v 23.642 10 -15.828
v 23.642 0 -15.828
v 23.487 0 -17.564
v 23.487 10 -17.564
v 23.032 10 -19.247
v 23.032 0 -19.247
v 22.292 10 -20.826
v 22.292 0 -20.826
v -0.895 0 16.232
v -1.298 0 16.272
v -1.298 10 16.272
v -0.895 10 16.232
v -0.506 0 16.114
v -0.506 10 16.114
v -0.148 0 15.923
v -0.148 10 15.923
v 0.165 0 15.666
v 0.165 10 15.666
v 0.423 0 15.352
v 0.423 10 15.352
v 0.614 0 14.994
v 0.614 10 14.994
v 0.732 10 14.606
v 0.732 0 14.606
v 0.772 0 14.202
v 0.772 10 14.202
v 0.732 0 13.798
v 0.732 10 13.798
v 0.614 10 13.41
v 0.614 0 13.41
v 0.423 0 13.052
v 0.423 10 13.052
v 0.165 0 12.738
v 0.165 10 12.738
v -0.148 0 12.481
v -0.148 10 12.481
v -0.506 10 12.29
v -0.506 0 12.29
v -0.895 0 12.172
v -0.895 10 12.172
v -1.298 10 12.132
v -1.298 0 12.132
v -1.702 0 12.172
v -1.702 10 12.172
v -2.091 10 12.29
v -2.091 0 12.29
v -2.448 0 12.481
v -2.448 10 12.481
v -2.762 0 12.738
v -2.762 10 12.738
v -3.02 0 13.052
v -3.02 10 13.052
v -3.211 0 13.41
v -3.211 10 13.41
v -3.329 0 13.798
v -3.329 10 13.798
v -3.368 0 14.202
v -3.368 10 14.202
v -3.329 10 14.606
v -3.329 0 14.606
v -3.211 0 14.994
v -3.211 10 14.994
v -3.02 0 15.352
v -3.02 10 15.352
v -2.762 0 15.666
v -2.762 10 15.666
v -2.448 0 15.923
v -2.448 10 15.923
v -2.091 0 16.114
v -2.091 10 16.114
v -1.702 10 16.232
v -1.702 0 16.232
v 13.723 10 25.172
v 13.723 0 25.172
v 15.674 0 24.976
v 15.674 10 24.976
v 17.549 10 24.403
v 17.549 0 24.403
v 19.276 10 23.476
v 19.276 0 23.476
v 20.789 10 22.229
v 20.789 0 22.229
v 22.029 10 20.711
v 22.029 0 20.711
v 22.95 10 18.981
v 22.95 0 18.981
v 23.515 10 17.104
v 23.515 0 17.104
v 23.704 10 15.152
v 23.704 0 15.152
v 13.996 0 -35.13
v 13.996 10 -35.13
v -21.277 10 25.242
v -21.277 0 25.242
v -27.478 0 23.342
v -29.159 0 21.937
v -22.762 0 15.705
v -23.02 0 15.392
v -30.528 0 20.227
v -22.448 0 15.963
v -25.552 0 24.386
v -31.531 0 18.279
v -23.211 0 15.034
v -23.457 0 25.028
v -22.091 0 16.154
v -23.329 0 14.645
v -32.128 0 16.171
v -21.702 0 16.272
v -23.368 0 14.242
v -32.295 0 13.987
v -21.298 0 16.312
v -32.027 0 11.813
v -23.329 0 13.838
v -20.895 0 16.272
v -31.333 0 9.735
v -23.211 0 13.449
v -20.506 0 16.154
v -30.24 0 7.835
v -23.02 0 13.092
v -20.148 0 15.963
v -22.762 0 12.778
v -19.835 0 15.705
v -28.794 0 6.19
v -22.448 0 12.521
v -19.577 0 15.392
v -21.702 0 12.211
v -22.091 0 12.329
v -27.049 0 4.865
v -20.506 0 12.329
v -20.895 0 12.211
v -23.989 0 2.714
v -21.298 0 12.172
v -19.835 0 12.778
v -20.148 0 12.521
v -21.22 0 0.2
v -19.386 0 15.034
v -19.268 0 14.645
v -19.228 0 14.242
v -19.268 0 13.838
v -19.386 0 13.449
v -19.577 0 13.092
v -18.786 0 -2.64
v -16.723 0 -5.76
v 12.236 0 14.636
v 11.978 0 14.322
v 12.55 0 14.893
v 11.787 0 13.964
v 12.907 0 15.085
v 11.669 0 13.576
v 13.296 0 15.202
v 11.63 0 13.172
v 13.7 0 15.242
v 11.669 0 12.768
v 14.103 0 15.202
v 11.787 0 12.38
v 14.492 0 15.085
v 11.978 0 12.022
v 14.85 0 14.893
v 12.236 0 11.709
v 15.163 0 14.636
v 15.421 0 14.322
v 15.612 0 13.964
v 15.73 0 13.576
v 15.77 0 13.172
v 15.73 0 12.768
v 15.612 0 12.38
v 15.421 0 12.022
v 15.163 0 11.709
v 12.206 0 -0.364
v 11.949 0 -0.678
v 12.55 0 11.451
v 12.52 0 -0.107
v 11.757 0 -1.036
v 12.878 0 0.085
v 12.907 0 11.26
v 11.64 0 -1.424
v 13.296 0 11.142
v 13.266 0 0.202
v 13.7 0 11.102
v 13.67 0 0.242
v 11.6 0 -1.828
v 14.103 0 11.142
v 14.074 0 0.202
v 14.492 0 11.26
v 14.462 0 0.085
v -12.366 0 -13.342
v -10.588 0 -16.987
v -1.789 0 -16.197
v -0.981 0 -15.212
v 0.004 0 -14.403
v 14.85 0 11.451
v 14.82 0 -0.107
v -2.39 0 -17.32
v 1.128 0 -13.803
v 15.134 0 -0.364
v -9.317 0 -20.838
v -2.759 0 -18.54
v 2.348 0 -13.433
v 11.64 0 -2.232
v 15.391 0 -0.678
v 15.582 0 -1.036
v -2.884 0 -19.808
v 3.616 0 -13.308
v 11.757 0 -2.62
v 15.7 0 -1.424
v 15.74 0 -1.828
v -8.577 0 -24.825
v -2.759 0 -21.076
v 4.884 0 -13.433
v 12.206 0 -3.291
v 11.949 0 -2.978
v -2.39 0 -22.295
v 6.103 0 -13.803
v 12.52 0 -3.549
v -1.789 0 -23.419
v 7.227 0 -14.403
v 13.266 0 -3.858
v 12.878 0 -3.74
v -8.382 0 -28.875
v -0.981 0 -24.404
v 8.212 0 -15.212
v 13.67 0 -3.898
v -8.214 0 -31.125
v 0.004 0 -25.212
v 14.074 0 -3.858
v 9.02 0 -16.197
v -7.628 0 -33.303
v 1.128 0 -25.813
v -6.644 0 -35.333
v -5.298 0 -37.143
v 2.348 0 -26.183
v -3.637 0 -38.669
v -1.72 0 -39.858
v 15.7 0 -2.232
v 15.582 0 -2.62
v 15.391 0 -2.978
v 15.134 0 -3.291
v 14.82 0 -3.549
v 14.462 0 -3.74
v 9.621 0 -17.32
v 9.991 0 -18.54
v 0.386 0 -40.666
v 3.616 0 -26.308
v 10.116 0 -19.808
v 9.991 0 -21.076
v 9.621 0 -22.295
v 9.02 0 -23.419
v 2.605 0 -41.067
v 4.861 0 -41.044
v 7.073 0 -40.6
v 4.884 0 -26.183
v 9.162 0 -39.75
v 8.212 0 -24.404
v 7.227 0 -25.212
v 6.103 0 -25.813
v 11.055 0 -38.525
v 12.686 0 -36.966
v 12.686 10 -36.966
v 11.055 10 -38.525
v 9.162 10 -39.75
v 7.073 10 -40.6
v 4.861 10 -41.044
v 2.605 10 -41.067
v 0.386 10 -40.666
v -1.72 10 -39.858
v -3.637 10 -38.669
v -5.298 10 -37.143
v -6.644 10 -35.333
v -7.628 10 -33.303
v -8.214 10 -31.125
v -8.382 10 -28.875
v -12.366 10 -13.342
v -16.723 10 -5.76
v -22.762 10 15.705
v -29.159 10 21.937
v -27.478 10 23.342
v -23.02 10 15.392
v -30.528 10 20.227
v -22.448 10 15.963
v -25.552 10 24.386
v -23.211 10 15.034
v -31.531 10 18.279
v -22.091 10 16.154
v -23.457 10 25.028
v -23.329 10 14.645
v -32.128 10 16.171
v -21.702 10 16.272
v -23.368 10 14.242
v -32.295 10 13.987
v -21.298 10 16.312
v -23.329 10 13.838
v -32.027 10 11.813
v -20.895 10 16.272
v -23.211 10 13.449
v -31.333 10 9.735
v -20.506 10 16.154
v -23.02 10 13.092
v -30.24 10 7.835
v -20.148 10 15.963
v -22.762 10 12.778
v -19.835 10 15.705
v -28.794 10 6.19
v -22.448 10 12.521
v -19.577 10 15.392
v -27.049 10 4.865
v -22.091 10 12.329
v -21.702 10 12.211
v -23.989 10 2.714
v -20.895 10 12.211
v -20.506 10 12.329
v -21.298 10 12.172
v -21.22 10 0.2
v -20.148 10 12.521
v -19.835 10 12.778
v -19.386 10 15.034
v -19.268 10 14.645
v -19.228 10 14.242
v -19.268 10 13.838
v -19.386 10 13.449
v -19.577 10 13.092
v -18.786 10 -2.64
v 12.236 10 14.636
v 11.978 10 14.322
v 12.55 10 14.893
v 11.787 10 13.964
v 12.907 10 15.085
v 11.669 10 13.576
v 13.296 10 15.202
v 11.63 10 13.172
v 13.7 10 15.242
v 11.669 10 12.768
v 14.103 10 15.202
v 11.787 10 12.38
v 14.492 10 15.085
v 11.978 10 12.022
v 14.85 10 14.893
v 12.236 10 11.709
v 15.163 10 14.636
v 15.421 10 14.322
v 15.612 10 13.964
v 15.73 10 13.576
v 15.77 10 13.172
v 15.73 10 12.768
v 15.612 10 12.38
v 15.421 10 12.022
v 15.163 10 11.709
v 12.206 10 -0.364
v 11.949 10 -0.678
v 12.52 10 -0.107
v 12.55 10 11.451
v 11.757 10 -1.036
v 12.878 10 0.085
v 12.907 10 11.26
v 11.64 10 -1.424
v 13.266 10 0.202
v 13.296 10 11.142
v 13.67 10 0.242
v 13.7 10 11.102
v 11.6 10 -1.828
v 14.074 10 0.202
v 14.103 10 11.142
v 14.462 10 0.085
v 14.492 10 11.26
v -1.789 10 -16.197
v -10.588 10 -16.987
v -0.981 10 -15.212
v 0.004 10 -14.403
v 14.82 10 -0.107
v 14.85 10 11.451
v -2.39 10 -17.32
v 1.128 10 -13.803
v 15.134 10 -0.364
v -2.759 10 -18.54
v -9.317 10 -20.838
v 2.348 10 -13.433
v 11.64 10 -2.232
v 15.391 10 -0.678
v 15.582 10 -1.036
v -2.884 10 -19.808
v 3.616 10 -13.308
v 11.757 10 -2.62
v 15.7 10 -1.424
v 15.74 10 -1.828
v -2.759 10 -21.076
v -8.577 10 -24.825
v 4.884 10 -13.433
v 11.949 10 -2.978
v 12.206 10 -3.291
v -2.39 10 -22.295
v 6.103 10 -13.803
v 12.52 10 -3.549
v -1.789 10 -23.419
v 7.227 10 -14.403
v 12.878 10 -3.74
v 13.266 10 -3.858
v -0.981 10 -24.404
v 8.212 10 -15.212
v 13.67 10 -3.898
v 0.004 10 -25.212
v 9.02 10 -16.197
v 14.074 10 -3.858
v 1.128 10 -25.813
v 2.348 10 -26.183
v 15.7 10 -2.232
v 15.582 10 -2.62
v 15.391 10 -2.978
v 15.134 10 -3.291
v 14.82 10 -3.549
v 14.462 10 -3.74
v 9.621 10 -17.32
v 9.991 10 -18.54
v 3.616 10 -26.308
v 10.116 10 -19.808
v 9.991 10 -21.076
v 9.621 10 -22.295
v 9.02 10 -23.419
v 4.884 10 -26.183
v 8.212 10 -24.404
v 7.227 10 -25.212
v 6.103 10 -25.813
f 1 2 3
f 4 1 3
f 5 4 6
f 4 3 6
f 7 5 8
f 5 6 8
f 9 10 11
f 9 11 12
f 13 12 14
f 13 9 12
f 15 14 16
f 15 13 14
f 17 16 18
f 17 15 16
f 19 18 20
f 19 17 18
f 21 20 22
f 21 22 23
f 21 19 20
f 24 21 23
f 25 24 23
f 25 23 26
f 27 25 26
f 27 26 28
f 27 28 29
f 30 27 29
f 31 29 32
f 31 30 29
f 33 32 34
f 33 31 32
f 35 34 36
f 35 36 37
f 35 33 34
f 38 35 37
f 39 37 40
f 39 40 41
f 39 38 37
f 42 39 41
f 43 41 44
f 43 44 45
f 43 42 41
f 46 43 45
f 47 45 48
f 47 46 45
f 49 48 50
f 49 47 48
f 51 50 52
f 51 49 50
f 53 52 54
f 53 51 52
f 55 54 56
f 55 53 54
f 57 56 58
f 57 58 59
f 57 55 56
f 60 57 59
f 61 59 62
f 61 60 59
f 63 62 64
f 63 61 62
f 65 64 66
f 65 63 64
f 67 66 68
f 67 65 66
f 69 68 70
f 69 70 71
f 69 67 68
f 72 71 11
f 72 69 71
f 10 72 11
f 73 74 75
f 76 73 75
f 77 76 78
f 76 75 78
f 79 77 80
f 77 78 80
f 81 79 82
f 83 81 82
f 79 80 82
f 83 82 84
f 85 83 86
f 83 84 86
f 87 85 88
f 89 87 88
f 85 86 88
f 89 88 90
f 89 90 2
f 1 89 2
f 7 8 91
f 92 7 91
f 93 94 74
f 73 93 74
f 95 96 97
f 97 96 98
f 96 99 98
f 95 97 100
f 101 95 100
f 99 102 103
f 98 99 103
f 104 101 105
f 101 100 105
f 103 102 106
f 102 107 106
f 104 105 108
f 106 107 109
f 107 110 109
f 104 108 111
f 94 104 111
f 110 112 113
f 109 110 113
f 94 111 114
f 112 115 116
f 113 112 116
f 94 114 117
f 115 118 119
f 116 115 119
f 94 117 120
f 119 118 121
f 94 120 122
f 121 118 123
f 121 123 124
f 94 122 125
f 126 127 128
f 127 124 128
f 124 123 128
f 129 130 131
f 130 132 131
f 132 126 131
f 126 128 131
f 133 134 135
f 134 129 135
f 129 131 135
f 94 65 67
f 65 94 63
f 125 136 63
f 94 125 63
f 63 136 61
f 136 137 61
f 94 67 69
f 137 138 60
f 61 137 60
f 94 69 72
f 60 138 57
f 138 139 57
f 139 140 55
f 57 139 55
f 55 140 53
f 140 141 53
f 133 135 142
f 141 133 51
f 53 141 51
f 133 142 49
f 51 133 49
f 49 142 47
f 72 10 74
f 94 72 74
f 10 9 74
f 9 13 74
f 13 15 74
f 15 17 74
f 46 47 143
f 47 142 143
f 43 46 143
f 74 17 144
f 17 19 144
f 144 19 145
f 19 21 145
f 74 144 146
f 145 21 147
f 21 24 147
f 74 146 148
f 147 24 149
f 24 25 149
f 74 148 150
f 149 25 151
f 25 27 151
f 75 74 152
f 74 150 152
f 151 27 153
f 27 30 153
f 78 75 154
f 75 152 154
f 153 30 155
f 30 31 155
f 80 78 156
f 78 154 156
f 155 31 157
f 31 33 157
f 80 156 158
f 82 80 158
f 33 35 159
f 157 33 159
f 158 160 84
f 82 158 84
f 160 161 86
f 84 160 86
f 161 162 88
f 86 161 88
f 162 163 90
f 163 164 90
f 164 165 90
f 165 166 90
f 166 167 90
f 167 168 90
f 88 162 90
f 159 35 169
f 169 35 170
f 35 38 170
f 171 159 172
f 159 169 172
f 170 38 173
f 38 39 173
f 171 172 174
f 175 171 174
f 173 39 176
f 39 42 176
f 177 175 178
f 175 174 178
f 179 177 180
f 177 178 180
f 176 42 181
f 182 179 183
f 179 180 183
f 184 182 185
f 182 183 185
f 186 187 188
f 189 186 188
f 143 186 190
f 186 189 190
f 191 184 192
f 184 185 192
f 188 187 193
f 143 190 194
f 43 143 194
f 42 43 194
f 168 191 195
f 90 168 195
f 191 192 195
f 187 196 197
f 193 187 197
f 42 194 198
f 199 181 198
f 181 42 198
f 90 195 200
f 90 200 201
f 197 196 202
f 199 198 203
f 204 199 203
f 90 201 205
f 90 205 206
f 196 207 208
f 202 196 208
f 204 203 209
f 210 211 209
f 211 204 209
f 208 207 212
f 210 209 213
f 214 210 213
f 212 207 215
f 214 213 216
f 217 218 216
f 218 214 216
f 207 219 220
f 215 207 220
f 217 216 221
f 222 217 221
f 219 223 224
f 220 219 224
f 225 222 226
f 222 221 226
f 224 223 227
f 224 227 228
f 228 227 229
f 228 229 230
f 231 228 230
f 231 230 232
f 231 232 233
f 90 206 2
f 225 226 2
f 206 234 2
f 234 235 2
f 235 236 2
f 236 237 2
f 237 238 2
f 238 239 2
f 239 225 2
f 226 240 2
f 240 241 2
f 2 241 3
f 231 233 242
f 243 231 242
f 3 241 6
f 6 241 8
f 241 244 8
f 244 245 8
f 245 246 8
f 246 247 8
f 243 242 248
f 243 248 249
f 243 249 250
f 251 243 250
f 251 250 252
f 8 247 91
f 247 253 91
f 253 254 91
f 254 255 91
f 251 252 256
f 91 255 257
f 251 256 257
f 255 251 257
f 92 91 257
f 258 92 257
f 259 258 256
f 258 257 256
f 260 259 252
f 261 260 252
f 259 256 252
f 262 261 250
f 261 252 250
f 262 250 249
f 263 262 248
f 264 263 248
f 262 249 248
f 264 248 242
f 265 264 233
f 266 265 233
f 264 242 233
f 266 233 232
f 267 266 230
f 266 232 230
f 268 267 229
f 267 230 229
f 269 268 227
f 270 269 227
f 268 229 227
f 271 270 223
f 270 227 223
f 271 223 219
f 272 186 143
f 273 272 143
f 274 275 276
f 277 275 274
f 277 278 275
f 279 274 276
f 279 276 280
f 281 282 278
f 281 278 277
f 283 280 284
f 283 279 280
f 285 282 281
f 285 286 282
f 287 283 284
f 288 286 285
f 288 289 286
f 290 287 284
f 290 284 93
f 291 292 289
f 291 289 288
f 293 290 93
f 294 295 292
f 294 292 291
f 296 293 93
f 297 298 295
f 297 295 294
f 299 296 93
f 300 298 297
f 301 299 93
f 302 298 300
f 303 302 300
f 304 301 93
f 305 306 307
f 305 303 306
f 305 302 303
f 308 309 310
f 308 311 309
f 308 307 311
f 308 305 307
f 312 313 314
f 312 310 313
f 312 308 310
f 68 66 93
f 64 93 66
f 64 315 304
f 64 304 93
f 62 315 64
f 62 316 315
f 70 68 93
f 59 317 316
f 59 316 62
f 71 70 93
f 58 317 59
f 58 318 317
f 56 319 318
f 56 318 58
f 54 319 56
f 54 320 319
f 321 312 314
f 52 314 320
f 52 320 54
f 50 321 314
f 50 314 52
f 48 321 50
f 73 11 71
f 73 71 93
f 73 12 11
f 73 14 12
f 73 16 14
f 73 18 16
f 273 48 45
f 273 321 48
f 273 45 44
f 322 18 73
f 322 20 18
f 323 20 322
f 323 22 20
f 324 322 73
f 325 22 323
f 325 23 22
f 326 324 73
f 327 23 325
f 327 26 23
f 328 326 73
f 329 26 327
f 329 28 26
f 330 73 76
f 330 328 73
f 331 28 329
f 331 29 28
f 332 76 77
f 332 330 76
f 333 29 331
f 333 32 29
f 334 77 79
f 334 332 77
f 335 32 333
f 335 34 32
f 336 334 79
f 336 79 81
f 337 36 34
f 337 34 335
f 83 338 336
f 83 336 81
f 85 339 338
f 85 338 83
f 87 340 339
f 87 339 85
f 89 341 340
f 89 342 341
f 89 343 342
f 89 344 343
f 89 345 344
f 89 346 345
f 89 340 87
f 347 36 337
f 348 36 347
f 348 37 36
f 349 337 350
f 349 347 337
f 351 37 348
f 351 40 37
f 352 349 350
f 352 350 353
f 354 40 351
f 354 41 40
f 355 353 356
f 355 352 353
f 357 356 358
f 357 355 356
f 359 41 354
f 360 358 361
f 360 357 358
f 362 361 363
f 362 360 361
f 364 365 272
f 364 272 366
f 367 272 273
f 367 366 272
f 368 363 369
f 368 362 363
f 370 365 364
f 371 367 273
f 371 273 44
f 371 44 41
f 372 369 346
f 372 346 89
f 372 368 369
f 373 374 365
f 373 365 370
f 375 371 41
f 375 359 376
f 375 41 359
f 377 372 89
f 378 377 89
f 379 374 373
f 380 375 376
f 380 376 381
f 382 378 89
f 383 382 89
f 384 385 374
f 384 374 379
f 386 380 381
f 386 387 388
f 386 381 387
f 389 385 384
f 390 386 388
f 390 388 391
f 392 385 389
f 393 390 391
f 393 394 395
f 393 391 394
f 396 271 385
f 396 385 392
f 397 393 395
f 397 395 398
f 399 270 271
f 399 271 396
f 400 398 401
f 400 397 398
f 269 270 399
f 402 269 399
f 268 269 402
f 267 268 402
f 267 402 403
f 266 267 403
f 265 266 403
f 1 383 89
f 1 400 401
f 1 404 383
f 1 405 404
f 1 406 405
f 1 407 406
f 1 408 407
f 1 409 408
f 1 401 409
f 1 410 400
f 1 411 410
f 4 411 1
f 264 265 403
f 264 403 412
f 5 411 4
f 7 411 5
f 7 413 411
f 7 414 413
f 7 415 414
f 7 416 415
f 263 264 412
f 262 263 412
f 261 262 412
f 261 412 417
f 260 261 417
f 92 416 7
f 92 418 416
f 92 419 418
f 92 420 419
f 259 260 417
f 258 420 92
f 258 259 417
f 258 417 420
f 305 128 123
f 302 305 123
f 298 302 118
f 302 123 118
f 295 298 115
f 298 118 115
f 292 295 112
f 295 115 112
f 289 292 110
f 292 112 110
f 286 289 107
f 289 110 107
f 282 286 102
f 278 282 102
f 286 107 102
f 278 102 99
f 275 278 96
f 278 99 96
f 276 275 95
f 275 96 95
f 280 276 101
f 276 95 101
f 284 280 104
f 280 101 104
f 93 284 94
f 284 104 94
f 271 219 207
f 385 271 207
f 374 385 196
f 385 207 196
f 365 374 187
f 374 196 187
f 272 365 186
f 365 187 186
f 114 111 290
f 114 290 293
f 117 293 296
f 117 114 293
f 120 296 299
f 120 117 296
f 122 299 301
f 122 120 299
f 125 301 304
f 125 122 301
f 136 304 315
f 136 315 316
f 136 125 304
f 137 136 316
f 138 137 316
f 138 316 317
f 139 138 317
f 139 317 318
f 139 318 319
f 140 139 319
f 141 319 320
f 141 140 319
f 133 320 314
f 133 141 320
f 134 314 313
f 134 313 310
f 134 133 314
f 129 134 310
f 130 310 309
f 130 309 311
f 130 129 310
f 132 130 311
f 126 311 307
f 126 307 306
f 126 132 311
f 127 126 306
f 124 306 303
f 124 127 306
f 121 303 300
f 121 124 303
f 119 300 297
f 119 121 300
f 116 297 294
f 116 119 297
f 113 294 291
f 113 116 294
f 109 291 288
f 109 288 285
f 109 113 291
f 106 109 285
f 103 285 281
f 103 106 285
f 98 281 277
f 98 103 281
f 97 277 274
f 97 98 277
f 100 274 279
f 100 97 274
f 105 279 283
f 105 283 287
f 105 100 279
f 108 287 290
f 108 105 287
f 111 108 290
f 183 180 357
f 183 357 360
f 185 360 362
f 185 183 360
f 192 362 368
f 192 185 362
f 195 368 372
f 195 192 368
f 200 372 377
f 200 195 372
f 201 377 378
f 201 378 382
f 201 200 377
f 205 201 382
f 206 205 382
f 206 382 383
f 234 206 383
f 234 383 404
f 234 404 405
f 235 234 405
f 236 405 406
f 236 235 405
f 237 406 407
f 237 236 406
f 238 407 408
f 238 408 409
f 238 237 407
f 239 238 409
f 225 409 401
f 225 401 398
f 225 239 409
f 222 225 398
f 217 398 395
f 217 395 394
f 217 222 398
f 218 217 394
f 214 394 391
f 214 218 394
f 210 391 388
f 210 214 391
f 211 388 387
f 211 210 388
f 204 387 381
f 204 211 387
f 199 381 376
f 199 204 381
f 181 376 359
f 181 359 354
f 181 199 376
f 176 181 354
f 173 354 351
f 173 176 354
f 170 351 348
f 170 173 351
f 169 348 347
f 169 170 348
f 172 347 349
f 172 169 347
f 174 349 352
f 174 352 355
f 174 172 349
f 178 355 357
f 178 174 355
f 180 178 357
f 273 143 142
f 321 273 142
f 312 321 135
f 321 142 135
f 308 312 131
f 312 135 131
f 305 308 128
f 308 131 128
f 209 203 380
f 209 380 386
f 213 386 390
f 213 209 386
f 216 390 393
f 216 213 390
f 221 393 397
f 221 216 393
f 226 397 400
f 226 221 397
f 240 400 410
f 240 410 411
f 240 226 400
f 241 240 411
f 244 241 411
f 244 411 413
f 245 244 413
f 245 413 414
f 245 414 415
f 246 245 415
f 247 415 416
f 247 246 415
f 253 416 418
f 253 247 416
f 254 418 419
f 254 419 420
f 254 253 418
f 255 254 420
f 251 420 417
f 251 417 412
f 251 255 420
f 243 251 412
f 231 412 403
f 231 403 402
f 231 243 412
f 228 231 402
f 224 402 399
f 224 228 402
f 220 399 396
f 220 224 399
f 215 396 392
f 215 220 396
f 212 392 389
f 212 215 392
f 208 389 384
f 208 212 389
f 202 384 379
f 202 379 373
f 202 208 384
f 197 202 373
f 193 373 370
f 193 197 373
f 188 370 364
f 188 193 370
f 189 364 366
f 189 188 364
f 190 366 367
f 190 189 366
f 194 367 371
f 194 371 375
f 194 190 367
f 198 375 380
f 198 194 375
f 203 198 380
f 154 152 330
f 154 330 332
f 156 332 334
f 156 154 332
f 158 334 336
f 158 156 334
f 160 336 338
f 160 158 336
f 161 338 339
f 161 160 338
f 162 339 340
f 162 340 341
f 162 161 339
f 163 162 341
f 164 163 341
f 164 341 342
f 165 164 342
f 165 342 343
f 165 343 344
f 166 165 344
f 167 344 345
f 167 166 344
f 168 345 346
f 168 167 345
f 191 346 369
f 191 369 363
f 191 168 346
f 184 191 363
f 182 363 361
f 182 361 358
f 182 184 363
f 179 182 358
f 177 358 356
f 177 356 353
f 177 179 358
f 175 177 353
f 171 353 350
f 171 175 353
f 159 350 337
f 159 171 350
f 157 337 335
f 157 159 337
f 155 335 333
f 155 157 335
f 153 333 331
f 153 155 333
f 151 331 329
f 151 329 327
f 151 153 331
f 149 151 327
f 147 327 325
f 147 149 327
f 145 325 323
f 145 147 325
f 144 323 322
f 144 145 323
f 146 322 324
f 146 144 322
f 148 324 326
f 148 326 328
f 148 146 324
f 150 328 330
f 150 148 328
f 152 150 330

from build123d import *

# Parameters (mm, degrees)
SKETCH1_R           = 2.070000001
SKETCH1_R_2         = 2.07
SKETCH1_R_3         = 6.5
BOSS_EXTRUDE1_DEPTH = 10


with BuildPart() as part:
    # Sketch1 → Boss-Extrude1 (new body)
    with BuildSketch(Plane(origin=(0, 0, 0), x_dir=(1, 0, 0), z_dir=(0, 1, 0))):
        with BuildLine():
            Line((23.703500556, -15.152403716), (23.64205667, 15.828297469))
            ThreePointArc((23.64205667, 15.828297469), (23.296182467, 18.41580704), (22.292396885, 20.825630528))
            Line((22.292396885, 20.825630528), (13.99606221, 35.129712685))
            ThreePointArc((13.99606221, 35.129712685), (0.385615186, 40.666219429), (-8.382044752, 28.875319789))
            ThreePointArc((-8.382044752, 28.875319789), (-9.316904265, 20.837743246), (-12.365890121, 13.342392404))
            Line((-12.365890121, 13.342392404), (-16.723498541, 5.760104356))
            ThreePointArc((-16.723498541, 5.760104356), (-21.220226961, -0.19980824), (-27.049399397, -4.864770548))
            ThreePointArc((-27.049399397, -4.864770548), (-31.881873053, -17.239982686), (-21.276578026, -25.241632171))
            Line((-21.276578026, -25.241632171), (13.723353139, -25.172216965))
            ThreePointArc((13.723353139, -25.172216965), (20.788598117, -22.229266547), (23.703500556, -15.152403716))
        make_face()
        with Locations(Location((-21.298394234, -14.241653805, 0), (0, 0, 270))):
            Circle(SKETCH1_R, mode=Mode.SUBTRACT)
        with Locations(Location((-1.298433568, -14.201987971, 0), (0, 0, 270))):
            Circle(SKETCH1_R_2, mode=Mode.SUBTRACT)
        with Locations(Location((13.69955364, -13.172240563, 0), (0, 0, 270))):
            Circle(SKETCH1_R_2, mode=Mode.SUBTRACT)
        with Locations(Location((13.669804266, 1.827729936, 0), (0, 0, 270))):
            Circle(SKETCH1_R_2, mode=Mode.SUBTRACT)
        with Locations(Location((3.615677553, 19.807825031, 0), (0, 0, 270))):
            Circle(SKETCH1_R_3, mode=Mode.SUBTRACT)
    extrude(amount=BOSS_EXTRUDE1_DEPTH)


solid = part.part
